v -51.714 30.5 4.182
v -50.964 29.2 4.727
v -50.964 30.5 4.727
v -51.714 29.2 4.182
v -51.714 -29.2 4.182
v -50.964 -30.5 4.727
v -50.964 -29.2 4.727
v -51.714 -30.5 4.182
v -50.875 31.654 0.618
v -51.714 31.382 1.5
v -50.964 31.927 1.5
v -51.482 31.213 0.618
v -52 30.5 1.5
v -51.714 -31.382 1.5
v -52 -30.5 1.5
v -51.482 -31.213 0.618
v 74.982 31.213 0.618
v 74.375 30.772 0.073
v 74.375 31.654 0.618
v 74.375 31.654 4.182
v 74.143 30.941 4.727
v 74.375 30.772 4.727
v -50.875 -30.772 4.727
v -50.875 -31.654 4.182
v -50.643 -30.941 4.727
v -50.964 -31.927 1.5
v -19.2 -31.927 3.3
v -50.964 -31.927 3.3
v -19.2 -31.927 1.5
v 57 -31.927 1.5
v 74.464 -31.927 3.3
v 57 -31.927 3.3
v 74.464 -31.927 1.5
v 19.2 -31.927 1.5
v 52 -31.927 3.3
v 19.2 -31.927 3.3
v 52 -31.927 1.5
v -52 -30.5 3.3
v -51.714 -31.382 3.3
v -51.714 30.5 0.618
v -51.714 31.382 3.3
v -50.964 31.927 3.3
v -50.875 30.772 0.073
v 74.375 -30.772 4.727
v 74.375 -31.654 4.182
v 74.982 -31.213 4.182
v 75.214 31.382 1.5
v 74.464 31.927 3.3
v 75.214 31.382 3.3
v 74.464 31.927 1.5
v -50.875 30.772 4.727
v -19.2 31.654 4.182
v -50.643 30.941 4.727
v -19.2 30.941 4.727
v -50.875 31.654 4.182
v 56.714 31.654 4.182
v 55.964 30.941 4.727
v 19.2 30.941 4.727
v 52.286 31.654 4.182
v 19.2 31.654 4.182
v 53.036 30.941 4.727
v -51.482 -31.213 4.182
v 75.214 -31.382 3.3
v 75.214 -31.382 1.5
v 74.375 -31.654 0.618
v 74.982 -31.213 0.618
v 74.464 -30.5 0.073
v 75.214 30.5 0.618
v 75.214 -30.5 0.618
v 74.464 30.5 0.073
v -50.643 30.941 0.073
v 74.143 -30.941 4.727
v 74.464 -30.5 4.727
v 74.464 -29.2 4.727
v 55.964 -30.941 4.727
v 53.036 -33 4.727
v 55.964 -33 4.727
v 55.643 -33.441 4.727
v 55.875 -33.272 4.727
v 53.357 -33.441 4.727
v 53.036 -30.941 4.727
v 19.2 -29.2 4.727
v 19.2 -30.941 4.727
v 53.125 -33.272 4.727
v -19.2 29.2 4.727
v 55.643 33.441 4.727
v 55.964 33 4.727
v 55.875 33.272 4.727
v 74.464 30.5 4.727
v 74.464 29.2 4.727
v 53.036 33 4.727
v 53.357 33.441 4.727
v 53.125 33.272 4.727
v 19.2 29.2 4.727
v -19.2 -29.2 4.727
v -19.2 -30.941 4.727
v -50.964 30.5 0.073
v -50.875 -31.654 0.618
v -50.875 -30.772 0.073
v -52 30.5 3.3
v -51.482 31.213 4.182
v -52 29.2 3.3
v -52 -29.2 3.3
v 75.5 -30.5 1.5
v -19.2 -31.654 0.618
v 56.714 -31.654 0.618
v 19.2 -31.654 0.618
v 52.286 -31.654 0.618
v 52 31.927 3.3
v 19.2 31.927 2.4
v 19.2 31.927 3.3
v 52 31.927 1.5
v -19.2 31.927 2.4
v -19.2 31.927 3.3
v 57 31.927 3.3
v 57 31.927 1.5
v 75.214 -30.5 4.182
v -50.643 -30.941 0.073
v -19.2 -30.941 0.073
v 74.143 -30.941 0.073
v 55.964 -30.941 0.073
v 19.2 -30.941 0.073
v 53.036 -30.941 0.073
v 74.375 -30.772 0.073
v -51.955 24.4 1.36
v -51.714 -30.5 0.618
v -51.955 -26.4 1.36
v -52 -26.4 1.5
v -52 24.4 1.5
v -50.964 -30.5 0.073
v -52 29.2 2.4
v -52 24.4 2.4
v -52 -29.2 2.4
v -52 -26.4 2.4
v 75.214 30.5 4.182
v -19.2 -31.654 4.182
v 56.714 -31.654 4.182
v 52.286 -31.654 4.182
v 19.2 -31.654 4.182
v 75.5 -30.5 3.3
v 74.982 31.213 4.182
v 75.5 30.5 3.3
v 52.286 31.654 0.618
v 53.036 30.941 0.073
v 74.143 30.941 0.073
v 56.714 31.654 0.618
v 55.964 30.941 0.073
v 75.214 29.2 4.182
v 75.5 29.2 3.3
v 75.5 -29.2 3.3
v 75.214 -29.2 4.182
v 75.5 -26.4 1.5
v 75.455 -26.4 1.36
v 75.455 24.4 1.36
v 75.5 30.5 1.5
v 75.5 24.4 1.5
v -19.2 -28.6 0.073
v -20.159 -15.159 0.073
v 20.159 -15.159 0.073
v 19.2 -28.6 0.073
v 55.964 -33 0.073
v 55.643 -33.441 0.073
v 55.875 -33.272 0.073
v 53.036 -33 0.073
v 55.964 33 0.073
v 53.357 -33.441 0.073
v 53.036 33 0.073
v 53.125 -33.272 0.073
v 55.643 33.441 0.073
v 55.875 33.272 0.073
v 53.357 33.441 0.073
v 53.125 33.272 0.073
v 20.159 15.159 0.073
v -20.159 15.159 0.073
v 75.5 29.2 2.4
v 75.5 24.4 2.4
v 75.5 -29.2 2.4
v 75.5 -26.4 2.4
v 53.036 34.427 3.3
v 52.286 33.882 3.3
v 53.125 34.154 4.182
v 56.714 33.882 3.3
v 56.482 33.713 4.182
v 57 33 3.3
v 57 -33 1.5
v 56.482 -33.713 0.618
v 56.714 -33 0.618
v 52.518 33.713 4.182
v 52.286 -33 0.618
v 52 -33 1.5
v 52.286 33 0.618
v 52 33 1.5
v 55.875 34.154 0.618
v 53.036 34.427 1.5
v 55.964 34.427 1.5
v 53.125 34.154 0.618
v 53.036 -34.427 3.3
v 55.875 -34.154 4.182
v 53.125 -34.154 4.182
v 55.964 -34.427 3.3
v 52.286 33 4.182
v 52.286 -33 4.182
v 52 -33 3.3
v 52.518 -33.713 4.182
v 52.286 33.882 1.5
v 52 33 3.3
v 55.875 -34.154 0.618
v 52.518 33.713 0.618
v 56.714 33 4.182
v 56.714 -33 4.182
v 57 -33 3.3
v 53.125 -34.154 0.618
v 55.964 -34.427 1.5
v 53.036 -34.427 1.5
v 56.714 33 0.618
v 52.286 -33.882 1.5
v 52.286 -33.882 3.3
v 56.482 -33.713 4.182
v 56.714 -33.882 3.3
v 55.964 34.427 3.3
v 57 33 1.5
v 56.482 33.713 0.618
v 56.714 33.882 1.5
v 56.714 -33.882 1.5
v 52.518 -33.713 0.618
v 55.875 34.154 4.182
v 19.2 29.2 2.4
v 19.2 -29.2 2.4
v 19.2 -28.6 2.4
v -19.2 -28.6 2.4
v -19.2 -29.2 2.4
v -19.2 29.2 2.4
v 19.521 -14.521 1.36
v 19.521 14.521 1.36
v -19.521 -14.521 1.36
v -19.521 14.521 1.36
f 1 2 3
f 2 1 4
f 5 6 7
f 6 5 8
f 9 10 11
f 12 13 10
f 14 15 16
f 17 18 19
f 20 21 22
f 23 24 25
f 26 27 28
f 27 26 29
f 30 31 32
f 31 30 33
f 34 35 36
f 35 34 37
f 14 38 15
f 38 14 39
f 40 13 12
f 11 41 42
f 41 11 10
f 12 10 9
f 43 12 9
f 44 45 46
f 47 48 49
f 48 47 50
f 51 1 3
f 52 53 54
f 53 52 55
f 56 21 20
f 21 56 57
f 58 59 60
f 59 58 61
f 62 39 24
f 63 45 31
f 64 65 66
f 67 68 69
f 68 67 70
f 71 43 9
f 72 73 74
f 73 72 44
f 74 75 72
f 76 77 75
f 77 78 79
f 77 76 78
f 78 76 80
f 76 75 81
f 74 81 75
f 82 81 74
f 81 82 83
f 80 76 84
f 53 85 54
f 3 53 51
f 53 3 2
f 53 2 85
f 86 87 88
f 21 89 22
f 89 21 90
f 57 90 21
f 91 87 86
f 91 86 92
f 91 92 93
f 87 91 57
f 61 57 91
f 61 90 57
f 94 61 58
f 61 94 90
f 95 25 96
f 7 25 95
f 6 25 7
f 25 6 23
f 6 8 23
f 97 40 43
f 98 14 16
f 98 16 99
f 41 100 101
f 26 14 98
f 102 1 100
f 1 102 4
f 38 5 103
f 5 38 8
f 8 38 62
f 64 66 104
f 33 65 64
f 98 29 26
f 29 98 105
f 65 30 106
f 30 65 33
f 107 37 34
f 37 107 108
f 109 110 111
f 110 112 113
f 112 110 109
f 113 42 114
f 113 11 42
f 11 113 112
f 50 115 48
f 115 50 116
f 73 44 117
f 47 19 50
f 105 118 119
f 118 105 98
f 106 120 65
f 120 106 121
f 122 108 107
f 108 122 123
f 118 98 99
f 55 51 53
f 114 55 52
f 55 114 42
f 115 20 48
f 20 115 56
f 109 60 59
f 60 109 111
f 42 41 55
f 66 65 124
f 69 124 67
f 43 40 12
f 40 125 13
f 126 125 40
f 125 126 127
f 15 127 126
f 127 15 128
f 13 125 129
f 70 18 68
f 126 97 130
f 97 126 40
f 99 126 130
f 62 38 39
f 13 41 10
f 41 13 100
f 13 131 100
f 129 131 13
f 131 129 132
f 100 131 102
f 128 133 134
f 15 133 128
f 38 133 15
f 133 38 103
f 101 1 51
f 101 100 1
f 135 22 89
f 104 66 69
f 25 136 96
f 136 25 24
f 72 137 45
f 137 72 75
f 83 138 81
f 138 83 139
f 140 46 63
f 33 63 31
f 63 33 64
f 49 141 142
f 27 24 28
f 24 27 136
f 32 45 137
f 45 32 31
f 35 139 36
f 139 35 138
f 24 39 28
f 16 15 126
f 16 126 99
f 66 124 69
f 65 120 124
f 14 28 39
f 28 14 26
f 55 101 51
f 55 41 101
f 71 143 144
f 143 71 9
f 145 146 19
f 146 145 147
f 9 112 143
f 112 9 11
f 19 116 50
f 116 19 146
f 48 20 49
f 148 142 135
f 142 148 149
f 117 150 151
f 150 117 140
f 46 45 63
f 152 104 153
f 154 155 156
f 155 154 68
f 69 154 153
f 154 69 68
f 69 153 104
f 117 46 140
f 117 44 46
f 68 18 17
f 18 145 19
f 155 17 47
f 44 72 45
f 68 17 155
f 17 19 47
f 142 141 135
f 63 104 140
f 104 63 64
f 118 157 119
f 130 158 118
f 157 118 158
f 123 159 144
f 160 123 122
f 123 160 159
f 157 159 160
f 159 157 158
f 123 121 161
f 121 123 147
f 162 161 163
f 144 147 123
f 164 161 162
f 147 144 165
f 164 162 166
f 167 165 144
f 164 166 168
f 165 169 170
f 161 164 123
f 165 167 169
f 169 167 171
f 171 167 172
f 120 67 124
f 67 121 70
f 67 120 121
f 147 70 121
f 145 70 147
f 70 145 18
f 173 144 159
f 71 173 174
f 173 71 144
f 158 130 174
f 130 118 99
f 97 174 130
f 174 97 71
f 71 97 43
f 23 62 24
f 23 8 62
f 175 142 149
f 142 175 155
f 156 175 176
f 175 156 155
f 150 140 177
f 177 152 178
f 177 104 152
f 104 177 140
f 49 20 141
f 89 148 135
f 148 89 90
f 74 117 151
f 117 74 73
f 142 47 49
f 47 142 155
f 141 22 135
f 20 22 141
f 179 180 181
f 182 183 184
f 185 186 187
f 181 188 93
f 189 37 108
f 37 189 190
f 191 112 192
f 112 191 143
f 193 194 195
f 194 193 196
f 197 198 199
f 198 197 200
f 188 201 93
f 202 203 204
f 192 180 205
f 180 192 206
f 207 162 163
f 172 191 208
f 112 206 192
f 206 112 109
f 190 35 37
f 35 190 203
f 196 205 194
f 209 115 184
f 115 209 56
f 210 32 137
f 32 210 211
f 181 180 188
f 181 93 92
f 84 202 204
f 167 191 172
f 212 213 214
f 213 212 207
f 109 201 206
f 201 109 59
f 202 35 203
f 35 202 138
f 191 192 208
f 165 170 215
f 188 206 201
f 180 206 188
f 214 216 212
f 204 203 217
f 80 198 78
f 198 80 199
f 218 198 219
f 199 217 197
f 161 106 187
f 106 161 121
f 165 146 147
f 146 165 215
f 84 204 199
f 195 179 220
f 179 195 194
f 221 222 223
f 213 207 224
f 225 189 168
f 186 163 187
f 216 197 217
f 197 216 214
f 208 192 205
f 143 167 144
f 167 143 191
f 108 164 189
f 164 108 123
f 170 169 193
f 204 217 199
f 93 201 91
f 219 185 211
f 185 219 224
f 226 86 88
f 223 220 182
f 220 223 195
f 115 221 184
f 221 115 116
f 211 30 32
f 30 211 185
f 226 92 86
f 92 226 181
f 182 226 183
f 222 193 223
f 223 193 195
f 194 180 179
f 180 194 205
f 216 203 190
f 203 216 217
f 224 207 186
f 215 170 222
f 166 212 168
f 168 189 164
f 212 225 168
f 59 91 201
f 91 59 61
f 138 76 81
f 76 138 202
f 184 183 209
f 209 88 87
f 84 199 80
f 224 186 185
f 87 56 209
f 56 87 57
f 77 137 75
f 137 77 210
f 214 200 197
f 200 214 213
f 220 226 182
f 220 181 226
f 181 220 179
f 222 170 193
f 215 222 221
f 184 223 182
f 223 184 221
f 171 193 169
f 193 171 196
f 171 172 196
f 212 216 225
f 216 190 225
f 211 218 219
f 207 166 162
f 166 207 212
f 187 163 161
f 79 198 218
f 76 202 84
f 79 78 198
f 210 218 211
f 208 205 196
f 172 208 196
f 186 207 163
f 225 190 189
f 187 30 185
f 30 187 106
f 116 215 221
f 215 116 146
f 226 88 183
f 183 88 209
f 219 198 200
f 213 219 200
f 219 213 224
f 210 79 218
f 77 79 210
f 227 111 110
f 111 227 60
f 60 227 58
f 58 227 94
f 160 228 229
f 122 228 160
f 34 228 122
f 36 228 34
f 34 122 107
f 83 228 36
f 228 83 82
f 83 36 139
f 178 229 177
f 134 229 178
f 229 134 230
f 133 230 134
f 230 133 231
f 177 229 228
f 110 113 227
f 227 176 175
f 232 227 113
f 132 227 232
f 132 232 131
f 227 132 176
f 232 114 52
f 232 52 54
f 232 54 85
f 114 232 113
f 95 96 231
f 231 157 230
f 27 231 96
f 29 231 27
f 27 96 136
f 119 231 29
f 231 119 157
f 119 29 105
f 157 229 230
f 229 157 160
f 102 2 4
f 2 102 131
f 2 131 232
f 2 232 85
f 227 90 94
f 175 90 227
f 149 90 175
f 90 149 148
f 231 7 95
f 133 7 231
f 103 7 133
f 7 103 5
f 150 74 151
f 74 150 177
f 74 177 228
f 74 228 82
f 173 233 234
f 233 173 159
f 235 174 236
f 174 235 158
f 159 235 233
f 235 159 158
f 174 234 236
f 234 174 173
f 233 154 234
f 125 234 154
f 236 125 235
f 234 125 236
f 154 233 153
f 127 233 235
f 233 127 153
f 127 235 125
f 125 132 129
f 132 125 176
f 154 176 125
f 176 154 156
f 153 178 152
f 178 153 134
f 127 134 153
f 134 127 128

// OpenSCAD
// -*- mode: SCAD ; c-file-style: "ellemtel" ; coding: utf-8 -*-
//
// Holder to scan Minox film strips with a Reflecta ProScan 10T
//
// Copyright 2018 Roland Sieker <ospalh@gmail.com>
// Licence: CC-BY-SA 4.0


/* [Global] */

// ... to preview. You will get all parts when you click "Create Thing".
part = "halter"; // [halter: lower part, einsatz: upper part, st: Stoessel, r: Rettungsschieber, s: stack, p: preview]

// Set this to "render" and click on "Create Thing" when done with the setup.
preview = 1; // [0:render, 1:preview]


/* [Slide frame] */

// Width of a slide frame in mm. Maybe set this to 50.8 mm, if American slide frames really are bigger thas 50 mm.
w_rahmen = 50;  // [15:0.1:60]

// Size of the hole for the actual picture. This is intentionally bigger than the hole in the frame.
w_bild = 28;  // [10:0.1:55]
// The same, in the other direction.
l_bild = 38;  // [10:0.1:55]
// Hight of a slide frame.
h_rahmen = 1.7;  // [0.2:0.05:3]

// Length of a slide frame. Usually the same as its length.
l_rahmen = 50;  // [15:0.1:60]

/* [Scanner] */

// Hight of the whole inset
h_ue_a = 4.8;  // [10:0.1:20]
// Width of the whole inset
w_gesamt = 64;  // [10:0.1:20]


// Size of the scanner from left to right
l_scanner = 104;  // [20:1:200]



/* [Extra] */

  // Rundungsradius
r_r = 1.5;  // [0.1:0.1:3]

// Laenge Zentrierkerbe
l_zk = 4;  // [0.1:0.1:20]
// Breite Zentrierkerbe
b_zk = 4;  // [0.1:0.1:20]
// Tiefe der Zentrierkerbe
h_zk = 1.2;  // [0.1:0.1:20]
// Wand bzw Abstand der Zentrierkerbe vom Rand
w_zk = 1;  // [0.1:0.1:20]


/* [Hidden] */

// Groessen des Halters.

// Laenge == Mass in Richtung des Filmlaus.
// Hoehe == Mass normal zum Film
// Breite oder Weite == Mass in Richtung Filmkante zu Filmkante

// Die beiden wichtigen. Wenn diese falsch sind passt's nicht oder wackelt.


l_sr = (l_scanner - l_bild)/2;

x_t_s = -1.5; // tweak fuer Stoessellaenge
x_t_f = +0.5; // tweak fuer Rahmen
y_t_n = -1; // tweak nut


l_griff = l_bild;
w_rand = 3;


w_stop = w_gesamt + 5;  // Breite fuer Klotz, der Durchschieben den Halters verhindert.
l_stop = 5;  // Laenge fuer diesen Klotz


w_schraeg = h_ue_a/4;

l_ueber = (3*l_rahmen - l_scanner)/2 + x_t_f ; // // Extrabreite rechts. Dient als Mass beim Einschieben
echo("l_ueber", l_ueber);

// *******************************************************
// Extra parameters. These can be changed reasonably safely.


w = 1.8;  // Wall width
p = 1.2;  // Bottom, top plate hight
c = 0.4;  // Clearance
c_h = 0.2;  // Spiel in Hoehe
angle = 60; // Overhangs much below 60 degrees are a problem for me

// *******************************************************
// Some shortcuts. These shouldn't be changed

tau = 2 * PI;  // pi is still wrong. tau = circumference / r

xy_factor = 1/tan(angle);
// To get from a hight to a horizontal width inclined correctly
z_factor = tan(angle);  // The other way around

some_distance = 1.2 * w_gesamt;
ms = 0.01;  // Muggeseggele.

// fn for differently sized objects and fs, fa; all for preview or rendering.
pna = 40;
pnb = 15;
pa = 5;
ps = 1;
rna = 180;
rnb = 30;
ra = 1;
rs = 0.1;
function na() = (preview) ? pna : rna;
function nb() = (preview) ? pnb : rnb;
$fs = (preview) ? ps : rs;
$fa = (preview) ? pa : ra;


l_ue_a =  l_sr + l_bild + l_sr + l_ueber;
w_einsatz = w_gesamt - 2 * w_rand;
h_bd = h_ue_a/2;  // Hoehe Boden oder Deckel


// h_bk = 0.2;  // Hoehe Bildkerbe. 0.4 mm (dies * 2) sollte reichen. Fuer 1. test
// w_br = 1;  // Extra Rand fuer Bildkerbe. (Mit der Perforation haben wir's.)
// l_br = 2;  // Extra Rand fuer Bildkerbe. (Mit der Perforation haben wir's.)
h_lkl = 0.75*h_bd;

// *******************************************************
// End setup




// *******************************************************
// Generate the parts


print_part();
// filmhalter();
// einsatz();
// preview_parts();
// stack_parts();


if ("p" == part)
{
   preview_parts();
}

if ("s" == part)
{
   stack_parts();
}

module print_part()
{
   if ("halter" == part)
   {
      filmhalter();
   }
   if ("einsatz" == part)
   {
      einsatz();
   }
   if ("st" == part)
   {
      stoessel();
   }
   if ("r" == part)
   {
      rettungsschieber();
   }
}

module preview_parts()
{
   filmhalter();
   translate([0, some_distance, 0])
   {
      einsatz();
   }
   translate([0, -some_distance, 0])
   {
      stoessel();
   }
}

module stack_parts()
{
   // intersection()
   {
      // color("yellow")
      {
         filmhalter();
      }
      translate([0,0,h_ue_a + ms])
      {
         rotate([180, 0,0])
         {
            // color("red")
            {
               einsatz();
            }
         }
      }
      translate([0,0,h_ue_a/2 - h_rahmen/2])
      {
         stoessel();
      }
   }
}

// *******************************************************
// Code for the parts themselves


module filmhalter()
{
   difference()
   {
      basis_filmhalter();
      fenster();
      translate([0,y_t_n,0])
      {
         langnut(w_rahmen+2*c, h_rahmen/2+c_h);
      }
      zentrierkerbe(-1);
   }
}

module einsatz()
{
   difference()
   {
      basis_einsatz();
      fenster();
      translate([0,-y_t_n,0])
      {
         langnut(w_rahmen+2*c, h_rahmen/2+c_h);
      }
      zentrierkerbe(1);
   }

}


module basis_filmhalter()
{
   translate([0,0,h_bd])
   {
      difference()
      {
         massiver_halter();
         einsatzausschnitt(c);
      }
   }
}


module basis_einsatz()
{
   translate([0,0,h_bd])
   {
      intersection()
      {
         massiver_halter();
         rotate([180, 0, 0])
         {
            einsatzausschnitt(0);
         }
      }
   }

}

module massiver_halter()
{
   translate([l_ueber/2, 0, 0])
   {
      rquad(l_ue_a, w_gesamt, h_ue_a);
   }
   translate([l_scanner/2+l_stop/2, 0, 0])
   {
      rquad(l_stop, w_stop, h_ue_a);
   }
}

module rquad(xx,yy,zz)
{
   quad(xx, yy, zz, r_r);
}

module quad(xx, yy, zz, rr)
{
   echo(xx, yy, zz, rr);
   hull()
   {
      vosp();
      mirror([0,0,1])
      {
         vosp();
      }
   }

   module vosp()
   {
      tosp();
      mirror([0,1,0])
      {
         tosp();
      }
   }
   module tosp()
   {
      osp();
      mirror([1,0,0])
      {
         osp();
      }

   }

   module osp()
   {
      translate([xx/2-rr, yy/2-rr, zz/2-rr])
      {
         sphere(r=rr);
      }
   }
}

module qquad(xx, yy, zz)
{
   intersection()
   {
      translate([-zz/2,0,0])
      {
         quad(xx,yy, zz, zz/2);
      }
      {
         translate([zz/2,0,0])
         {
            cube([xx+zz,yy, zz], center=true);
         }
      }
   }

}

module einsatzausschnitt(ec)
{
   translate([0, 0, h_ue_a])
   {
      cube(
         [l_ue_a+2*ms + 2*l_ueber, w_einsatz + ec, 2*h_ue_a],
         center=true);  // Zu lang. Kein Problem

      grip_cut();
   }
   module grip_cut()
   {
      cube([l_griff + ec, w_gesamt + 2*ms, 2*h_ue_a], center=true);
      translate([0, -w_gesamt/2, 0])
      {
         cube([l_griff + ec, 2*w_rand+2*ec, 4*h_ue_a], center=true);
      }
   }
}

module fenster()
{
   translate([0, 0, h_bd])
   {
      hull()
      {
         translate([0,0,-0.5+ms])
         {
            cube([l_bild, w_bild, 1], center=true);
         }
         translate([0,0,-h_bd-0.5-ms])
         {
            cube(
               [l_bild+2*w_schraeg, w_bild+2*w_schraeg, 1], center=true);
         }
      }

   }
}



module zentrierkerbe(sf)
{
   // Den Radius der Zentrierkerbe kann mensch per Pythagoras bestimmen.
   // Hypothenuse = r_zk
   // 1. Kathete = l_zk/2
   // 2. Kathete = r_zk - h_zk
   // h_zk > 0
   // r_zk * r_zk = l_zk * l_zk / 4 + r_zk * r_zk - 2 * r_zk * h_zk + h_zk * h_zk
   // 0 = l_zk * l_zk / 4 - 2 * r_zk * h_zk + h_zk * h_zk
   // 2 * r_zk * h_zk =
   r_zk = (l_zk * l_zk / 4 + h_zk * h_zk) / (2 * h_zk);
   translate([0, sf*(w_gesamt/2 + r_zk - h_zk), -ms])
   {
      // rotate([90,0,0])
      {
         cylinder(r=r_zk, h=h_ue_a+2*ms);
      }
   }
}


module langnut(kw, kh)
{
   translate([0, 0, h_bd-kh/2+ms])
   {
      cube([l_ue_a+2*ms + 2*l_ueber, kw, kh], center=true);
      // Zu lang. Kein Problem
   }

}


module stoessel()
{
   translate([0.5*l_rahmen,0, 0])
   {
      translate([+20, 0, h_rahmen/2-c_h/2])
      {
         qquad(l_rahmen+40, l_rahmen-2*c, h_rahmen-c_h);
      }
      translate([l_rahmen/2+2.5 + x_t_s, 0, h_ue_a])
      {
         rquad(5, l_rahmen - 2*c, 2*h_ue_a);
      }
   }
   translate([l_rahmen+5, -5, h_rahmen-c_h-ms])
   {
      linear_extrude(1, convexity=8)
      {
         text(
            text="\U01f898", font="Symbola:style=Regular",
            valign="center", halign="left", size=32);
         // Sigh. I originally had just put in the character
         // directly. Files with just a single non-ASCII broke the
         // customizer a while ago.
      }
   }
}


module rettungsschieber()
{
   qquad(l_ue_a+30, l_rahmen-2*c, h_rahmen-c_h);
}
